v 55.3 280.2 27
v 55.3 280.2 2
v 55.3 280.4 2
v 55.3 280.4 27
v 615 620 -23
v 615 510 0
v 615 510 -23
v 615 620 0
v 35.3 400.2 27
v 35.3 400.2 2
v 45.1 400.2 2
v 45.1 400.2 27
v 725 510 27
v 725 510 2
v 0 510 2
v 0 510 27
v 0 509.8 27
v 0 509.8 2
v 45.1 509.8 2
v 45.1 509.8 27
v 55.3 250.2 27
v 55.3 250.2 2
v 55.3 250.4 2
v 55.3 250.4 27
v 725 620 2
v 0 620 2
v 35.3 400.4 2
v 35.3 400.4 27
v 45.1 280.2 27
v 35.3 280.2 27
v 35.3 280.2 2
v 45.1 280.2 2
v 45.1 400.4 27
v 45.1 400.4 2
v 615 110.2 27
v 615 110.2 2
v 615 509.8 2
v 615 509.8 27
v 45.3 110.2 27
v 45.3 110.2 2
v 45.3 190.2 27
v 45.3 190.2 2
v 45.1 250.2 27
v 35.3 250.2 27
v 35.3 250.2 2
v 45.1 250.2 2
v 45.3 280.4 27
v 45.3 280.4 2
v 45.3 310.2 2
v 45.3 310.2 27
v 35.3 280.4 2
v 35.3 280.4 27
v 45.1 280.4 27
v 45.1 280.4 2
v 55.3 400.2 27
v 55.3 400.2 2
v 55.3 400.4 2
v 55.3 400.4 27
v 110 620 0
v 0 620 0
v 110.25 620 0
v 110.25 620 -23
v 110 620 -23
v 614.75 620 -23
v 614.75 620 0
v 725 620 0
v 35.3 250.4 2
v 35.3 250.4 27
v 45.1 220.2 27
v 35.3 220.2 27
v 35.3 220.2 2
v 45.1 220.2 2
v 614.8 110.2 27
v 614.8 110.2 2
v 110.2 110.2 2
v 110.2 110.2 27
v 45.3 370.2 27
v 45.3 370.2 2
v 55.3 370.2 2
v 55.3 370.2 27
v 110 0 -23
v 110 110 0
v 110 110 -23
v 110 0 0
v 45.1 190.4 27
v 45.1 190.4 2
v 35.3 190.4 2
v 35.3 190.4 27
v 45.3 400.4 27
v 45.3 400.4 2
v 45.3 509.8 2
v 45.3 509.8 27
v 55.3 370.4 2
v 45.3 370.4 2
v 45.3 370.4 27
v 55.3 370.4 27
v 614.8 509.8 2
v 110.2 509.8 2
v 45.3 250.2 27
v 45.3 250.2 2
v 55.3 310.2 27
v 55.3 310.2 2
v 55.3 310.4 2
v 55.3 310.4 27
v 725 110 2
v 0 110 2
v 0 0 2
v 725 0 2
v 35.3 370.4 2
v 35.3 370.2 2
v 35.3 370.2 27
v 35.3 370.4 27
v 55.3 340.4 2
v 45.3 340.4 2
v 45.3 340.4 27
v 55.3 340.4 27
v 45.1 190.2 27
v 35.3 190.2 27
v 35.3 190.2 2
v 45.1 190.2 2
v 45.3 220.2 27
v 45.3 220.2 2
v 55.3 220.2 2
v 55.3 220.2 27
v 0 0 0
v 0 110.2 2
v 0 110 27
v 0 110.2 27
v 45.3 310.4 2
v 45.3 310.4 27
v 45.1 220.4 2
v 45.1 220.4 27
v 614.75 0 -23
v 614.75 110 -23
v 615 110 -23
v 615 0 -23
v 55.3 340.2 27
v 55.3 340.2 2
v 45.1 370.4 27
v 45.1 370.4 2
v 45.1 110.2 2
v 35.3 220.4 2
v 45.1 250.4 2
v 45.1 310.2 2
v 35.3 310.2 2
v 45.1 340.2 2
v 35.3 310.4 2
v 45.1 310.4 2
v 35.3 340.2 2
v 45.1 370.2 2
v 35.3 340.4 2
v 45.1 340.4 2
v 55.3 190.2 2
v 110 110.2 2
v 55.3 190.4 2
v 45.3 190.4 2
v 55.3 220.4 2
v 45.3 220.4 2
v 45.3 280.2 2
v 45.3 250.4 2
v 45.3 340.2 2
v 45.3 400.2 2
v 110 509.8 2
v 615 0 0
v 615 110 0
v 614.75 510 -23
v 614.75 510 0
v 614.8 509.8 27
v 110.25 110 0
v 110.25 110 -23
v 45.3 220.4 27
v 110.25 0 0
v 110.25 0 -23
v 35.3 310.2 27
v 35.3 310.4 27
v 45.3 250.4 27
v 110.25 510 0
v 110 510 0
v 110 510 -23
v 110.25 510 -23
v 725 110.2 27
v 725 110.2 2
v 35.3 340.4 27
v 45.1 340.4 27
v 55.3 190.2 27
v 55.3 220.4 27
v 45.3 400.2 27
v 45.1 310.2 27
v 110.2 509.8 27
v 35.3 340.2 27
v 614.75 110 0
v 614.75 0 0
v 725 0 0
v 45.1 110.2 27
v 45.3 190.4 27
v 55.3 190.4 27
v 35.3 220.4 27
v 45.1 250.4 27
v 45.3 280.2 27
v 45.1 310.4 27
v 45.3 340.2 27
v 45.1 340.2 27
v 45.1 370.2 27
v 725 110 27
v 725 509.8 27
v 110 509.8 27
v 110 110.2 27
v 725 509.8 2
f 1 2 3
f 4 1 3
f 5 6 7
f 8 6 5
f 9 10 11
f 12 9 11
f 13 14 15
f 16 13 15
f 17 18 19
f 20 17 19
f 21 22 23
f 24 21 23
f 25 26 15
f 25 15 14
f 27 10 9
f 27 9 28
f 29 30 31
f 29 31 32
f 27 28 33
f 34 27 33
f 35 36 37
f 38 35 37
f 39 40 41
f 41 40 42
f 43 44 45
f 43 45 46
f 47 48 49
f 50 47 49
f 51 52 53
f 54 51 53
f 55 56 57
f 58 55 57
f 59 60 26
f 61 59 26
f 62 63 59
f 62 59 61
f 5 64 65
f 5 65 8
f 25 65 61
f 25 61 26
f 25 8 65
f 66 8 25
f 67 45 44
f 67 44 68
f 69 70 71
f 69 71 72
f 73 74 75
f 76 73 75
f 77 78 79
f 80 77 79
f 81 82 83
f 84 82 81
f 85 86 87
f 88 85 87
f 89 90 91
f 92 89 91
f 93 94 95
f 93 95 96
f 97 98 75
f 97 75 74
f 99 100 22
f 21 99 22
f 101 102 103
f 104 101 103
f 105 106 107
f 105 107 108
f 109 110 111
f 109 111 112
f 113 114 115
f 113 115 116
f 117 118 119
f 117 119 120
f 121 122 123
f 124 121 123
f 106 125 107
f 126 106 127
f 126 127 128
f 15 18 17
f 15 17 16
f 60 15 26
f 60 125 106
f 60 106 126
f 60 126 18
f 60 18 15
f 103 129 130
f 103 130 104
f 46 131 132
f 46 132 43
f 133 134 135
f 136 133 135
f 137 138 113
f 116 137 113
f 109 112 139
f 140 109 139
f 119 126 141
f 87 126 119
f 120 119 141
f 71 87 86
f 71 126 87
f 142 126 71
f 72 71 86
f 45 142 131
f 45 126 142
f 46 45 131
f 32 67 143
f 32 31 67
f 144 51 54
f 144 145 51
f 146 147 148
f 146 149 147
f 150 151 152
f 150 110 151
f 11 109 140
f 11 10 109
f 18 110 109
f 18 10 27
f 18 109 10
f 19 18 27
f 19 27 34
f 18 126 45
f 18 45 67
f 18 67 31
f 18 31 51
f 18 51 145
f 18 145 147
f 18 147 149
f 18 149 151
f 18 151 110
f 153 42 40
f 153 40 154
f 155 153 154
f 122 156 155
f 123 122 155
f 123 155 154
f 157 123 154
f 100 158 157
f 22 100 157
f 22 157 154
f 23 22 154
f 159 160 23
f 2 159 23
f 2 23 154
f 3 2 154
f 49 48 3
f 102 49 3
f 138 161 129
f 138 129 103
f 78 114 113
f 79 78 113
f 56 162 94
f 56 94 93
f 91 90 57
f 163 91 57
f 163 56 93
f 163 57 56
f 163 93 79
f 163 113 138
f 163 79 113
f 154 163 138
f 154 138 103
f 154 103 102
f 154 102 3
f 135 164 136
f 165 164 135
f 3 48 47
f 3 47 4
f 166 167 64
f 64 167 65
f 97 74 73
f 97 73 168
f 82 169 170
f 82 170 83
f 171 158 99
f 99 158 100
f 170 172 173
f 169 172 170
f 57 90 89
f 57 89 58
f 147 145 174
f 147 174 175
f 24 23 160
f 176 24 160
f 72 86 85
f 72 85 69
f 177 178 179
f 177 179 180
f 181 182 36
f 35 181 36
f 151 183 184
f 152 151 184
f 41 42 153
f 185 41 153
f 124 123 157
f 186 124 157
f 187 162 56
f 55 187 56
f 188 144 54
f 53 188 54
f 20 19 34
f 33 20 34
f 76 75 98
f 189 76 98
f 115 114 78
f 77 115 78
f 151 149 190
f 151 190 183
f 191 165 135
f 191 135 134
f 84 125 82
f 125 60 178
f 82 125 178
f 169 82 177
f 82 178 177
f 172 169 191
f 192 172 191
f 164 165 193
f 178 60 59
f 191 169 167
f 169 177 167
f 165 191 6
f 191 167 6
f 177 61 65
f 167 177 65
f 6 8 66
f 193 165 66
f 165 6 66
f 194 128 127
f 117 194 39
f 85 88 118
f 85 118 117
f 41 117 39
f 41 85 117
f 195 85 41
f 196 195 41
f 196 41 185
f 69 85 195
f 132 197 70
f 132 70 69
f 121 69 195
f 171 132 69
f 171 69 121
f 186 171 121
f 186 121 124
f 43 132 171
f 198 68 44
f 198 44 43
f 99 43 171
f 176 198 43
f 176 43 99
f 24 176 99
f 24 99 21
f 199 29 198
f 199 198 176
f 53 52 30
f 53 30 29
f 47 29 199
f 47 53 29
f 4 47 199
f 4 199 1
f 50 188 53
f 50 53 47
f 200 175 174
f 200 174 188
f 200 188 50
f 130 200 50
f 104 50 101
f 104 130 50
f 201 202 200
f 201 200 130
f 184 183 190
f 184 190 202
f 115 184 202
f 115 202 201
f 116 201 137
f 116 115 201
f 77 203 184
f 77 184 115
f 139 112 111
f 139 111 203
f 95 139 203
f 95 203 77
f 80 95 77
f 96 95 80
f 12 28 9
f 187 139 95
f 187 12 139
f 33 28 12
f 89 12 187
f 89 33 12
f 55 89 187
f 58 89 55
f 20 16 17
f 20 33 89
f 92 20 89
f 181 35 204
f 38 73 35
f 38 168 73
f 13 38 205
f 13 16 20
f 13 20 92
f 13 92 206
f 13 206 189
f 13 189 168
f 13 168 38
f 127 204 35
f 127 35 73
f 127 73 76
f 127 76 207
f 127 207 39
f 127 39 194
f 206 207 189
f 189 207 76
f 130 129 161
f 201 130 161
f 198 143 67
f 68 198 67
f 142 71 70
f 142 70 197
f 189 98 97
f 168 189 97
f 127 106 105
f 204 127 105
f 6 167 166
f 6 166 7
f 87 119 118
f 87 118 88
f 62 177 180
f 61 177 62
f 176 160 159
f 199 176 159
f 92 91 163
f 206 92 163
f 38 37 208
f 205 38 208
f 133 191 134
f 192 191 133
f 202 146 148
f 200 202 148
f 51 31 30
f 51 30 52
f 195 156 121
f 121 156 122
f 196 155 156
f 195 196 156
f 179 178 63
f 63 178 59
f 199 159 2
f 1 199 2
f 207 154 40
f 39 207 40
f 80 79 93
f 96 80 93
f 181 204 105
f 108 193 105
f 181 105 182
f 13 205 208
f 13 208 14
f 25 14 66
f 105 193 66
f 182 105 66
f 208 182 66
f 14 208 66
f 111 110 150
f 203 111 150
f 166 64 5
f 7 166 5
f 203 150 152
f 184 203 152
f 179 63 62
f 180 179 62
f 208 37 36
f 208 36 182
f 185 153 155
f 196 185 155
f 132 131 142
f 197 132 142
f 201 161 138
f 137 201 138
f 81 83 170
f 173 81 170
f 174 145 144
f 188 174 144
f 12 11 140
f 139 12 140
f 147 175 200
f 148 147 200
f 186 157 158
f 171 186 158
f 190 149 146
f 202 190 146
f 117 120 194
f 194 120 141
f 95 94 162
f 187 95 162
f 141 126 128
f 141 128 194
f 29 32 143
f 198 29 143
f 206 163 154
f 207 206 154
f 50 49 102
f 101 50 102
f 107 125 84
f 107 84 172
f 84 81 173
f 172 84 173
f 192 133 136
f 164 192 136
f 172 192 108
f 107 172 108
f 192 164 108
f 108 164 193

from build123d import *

# Parameters (mm, degrees)
F0_W     = 725
F0_H     = 620
F1_DEPTH = 2
F2_W     = 0.25
F2_H     = 110
F3_DEPTH = 25
F4_DEPTH = 25
F2_W_2   = 110
F2_H_2   = 0.2
F2_W_3   = 0.2
F2_H_3   = 399.6
F5_DEPTH = 25
F2_W_4   = 64.7
F6_DEPTH = 25
F2_W_5   = 45.1
F7_DEPTH = 25
F2_H_4   = 49.5626640439
F8_DEPTH = 25
F2_H_5   = 109.4
F2_W_6   = 9.8
F2_H_6   = 30.4373359561
F2_W_7   = 10
F2_H_7   = 29.8
F9_DEPTH = 25


# Not quite as in the source:
# - a feature names something its author has since deleted; it is built from what else it names


with BuildPart() as f1:
    # F0 (on Top) → F1 (new body)
    with BuildSketch(Plane.XY):
        with Locations((362.5, 310)):
            Rectangle(F0_W, F0_H)
    extrude(amount=F1_DEPTH)

    # F2 (on face) → F3 (join)
    with BuildSketch(Plane.XY.offset(2)):
        with Locations((614.875, 565)):
            Rectangle(F2_W, F2_H)
        with Locations((110.125, 565)):
            Rectangle(F2_W, F2_H)
        Polygon((110.2, 110), (110, 110), (110, 0), (110.25, 0), (110.25, 110), align=None)
        Polygon((615, 110), (614.8, 110), (614.75, 110), (614.75, 0), (615, 0), align=None)
    extrude(amount=-F3_DEPTH)

    # F2 (on face) → F4 (join)
    with BuildSketch(Plane.XY.offset(2)):
        Polygon((110, 510), (0, 510), (0, 509.8), (45.1, 509.8), (45.3, 509.8), (110, 509.8), align=None)
        Polygon((614.75, 510), (110.25, 510), (110.25, 509.8), (614.8, 509.8), (615, 509.8), (615, 510), align=None)
    extrude(amount=F4_DEPTH)

    # F2 (on face) → F5 (join)
    with BuildSketch(Plane.XY.offset(2)):
        with Locations((670, 509.9)):
            Rectangle(F2_W_2, F2_H_2)
        with Locations((614.9, 310)):
            Rectangle(F2_W_3, F2_H_3)
    extrude(amount=F5_DEPTH)

    # F2 (on face) → F6 (join)
    with BuildSketch(Plane.XY.offset(2)):
        with Locations((670, 110.1)):
            Rectangle(F2_W_2, F2_H_2)
        Polygon((614.8, 110.2), (110.2, 110.2), (110.2, 110), (110.25, 110), (614.75, 110), (614.8, 110), align=None)
        with Locations((614.9, 110.1)):
            Rectangle(F2_W_3, F2_H_2)
        with Locations((77.65, 110.1)):
            Rectangle(F2_W_4, F2_H_2)
        with Locations((110.1, 110.1)):
            Rectangle(F2_W_3, F2_H_2)
    extrude(amount=F6_DEPTH)

    # F2 (on face) → F7 (join)
    with BuildSketch(Plane.XY.offset(2)):
        with Locations((22.55, 110.1)):
            Rectangle(F2_W_5, F2_H_2)
    extrude(amount=F7_DEPTH)

    # F2 (on face) → F8 (join)
    with BuildSketch(Plane.XY.offset(2)):
        with Locations((45.2, 165.418667978)):
            Rectangle(F2_W_3, F2_H_4)
    extrude(amount=F8_DEPTH)

    # F2 (on face) → F9 (join)
    with BuildSketch(Plane.XY.offset(2)):
        Polygon((110.25, 510), (110, 510), (110, 509.8), (110.2, 509.8), (110.25, 509.8), align=None)
        with Locations((110.1, 310)):
            Rectangle(F2_W_3, F2_H_3)
        with Locations((45.2, 455.1)):
            Rectangle(F2_W_3, F2_H_5)
        with Locations((45.2, 400.3)):
            Rectangle(F2_W_3, F2_H_2)
        with Locations((40.2, 400.3)):
            Rectangle(F2_W_6, F2_H_2)
        with Locations((45.2, 125.418667978)):
            Rectangle(F2_W_3, F2_H_6)
        with Locations((45.2, 110.1)):
            Rectangle(F2_W_3, F2_H_2)
        with Locations((50.3, 400.3)):
            Rectangle(F2_W_7, F2_H_2)
        with Locations((45.2, 385.3)):
            Rectangle(F2_W_3, F2_H_7)
        with Locations((45.2, 165.418667978)):
            Rectangle(F2_W_3, F2_H_4)
        with Locations((45.2, 370.3)):
            Rectangle(F2_W_3, F2_H_2)
        with Locations((40.2, 370.3)):
            Rectangle(F2_W_6, F2_H_2)
        with Locations((40.2, 190.3)):
            Rectangle(F2_W_6, F2_H_2)
        with Locations((45.2, 190.3)):
            Rectangle(F2_W_3, F2_H_2)
        with Locations((50.3, 370.3)):
            Rectangle(F2_W_7, F2_H_2)
        with Locations((50.3, 190.3)):
            Rectangle(F2_W_7, F2_H_2)
        with Locations((45.2, 355.3)):
            Rectangle(F2_W_3, F2_H_7)
        with Locations((45.2, 205.3)):
            Rectangle(F2_W_3, F2_H_7)
        with Locations((45.2, 340.3)):
            Rectangle(F2_W_3, F2_H_2)
        with Locations((40.2, 340.3)):
            Rectangle(F2_W_6, F2_H_2)
        with Locations((40.2, 220.3)):
            Rectangle(F2_W_6, F2_H_2)
        with Locations((45.2, 220.3)):
            Rectangle(F2_W_3, F2_H_2)
        with Locations((50.3, 340.3)):
            Rectangle(F2_W_7, F2_H_2)
        with Locations((50.3, 220.3)):
            Rectangle(F2_W_7, F2_H_2)
        with Locations((45.2, 325.3)):
            Rectangle(F2_W_3, F2_H_7)
        with Locations((45.2, 235.3)):
            Rectangle(F2_W_3, F2_H_7)
        with Locations((45.2, 310.3)):
            Rectangle(F2_W_3, F2_H_2)
        with Locations((40.2, 310.3)):
            Rectangle(F2_W_6, F2_H_2)
        with Locations((40.2, 250.3)):
            Rectangle(F2_W_6, F2_H_2)
        with Locations((45.2, 250.3)):
            Rectangle(F2_W_3, F2_H_2)
        with Locations((50.3, 310.3)):
            Rectangle(F2_W_7, F2_H_2)
        with Locations((50.3, 250.3)):
            Rectangle(F2_W_7, F2_H_2)
        with Locations((45.2, 295.3)):
            Rectangle(F2_W_3, F2_H_7)
        with Locations((45.2, 265.3)):
            Rectangle(F2_W_3, F2_H_7)
        with Locations((45.2, 280.3)):
            Rectangle(F2_W_3, F2_H_2)
        with Locations((40.2, 280.3)):
            Rectangle(F2_W_6, F2_H_2)
        with Locations((50.3, 280.3)):
            Rectangle(F2_W_7, F2_H_2)
    extrude(amount=F9_DEPTH)


solid = f1.part
